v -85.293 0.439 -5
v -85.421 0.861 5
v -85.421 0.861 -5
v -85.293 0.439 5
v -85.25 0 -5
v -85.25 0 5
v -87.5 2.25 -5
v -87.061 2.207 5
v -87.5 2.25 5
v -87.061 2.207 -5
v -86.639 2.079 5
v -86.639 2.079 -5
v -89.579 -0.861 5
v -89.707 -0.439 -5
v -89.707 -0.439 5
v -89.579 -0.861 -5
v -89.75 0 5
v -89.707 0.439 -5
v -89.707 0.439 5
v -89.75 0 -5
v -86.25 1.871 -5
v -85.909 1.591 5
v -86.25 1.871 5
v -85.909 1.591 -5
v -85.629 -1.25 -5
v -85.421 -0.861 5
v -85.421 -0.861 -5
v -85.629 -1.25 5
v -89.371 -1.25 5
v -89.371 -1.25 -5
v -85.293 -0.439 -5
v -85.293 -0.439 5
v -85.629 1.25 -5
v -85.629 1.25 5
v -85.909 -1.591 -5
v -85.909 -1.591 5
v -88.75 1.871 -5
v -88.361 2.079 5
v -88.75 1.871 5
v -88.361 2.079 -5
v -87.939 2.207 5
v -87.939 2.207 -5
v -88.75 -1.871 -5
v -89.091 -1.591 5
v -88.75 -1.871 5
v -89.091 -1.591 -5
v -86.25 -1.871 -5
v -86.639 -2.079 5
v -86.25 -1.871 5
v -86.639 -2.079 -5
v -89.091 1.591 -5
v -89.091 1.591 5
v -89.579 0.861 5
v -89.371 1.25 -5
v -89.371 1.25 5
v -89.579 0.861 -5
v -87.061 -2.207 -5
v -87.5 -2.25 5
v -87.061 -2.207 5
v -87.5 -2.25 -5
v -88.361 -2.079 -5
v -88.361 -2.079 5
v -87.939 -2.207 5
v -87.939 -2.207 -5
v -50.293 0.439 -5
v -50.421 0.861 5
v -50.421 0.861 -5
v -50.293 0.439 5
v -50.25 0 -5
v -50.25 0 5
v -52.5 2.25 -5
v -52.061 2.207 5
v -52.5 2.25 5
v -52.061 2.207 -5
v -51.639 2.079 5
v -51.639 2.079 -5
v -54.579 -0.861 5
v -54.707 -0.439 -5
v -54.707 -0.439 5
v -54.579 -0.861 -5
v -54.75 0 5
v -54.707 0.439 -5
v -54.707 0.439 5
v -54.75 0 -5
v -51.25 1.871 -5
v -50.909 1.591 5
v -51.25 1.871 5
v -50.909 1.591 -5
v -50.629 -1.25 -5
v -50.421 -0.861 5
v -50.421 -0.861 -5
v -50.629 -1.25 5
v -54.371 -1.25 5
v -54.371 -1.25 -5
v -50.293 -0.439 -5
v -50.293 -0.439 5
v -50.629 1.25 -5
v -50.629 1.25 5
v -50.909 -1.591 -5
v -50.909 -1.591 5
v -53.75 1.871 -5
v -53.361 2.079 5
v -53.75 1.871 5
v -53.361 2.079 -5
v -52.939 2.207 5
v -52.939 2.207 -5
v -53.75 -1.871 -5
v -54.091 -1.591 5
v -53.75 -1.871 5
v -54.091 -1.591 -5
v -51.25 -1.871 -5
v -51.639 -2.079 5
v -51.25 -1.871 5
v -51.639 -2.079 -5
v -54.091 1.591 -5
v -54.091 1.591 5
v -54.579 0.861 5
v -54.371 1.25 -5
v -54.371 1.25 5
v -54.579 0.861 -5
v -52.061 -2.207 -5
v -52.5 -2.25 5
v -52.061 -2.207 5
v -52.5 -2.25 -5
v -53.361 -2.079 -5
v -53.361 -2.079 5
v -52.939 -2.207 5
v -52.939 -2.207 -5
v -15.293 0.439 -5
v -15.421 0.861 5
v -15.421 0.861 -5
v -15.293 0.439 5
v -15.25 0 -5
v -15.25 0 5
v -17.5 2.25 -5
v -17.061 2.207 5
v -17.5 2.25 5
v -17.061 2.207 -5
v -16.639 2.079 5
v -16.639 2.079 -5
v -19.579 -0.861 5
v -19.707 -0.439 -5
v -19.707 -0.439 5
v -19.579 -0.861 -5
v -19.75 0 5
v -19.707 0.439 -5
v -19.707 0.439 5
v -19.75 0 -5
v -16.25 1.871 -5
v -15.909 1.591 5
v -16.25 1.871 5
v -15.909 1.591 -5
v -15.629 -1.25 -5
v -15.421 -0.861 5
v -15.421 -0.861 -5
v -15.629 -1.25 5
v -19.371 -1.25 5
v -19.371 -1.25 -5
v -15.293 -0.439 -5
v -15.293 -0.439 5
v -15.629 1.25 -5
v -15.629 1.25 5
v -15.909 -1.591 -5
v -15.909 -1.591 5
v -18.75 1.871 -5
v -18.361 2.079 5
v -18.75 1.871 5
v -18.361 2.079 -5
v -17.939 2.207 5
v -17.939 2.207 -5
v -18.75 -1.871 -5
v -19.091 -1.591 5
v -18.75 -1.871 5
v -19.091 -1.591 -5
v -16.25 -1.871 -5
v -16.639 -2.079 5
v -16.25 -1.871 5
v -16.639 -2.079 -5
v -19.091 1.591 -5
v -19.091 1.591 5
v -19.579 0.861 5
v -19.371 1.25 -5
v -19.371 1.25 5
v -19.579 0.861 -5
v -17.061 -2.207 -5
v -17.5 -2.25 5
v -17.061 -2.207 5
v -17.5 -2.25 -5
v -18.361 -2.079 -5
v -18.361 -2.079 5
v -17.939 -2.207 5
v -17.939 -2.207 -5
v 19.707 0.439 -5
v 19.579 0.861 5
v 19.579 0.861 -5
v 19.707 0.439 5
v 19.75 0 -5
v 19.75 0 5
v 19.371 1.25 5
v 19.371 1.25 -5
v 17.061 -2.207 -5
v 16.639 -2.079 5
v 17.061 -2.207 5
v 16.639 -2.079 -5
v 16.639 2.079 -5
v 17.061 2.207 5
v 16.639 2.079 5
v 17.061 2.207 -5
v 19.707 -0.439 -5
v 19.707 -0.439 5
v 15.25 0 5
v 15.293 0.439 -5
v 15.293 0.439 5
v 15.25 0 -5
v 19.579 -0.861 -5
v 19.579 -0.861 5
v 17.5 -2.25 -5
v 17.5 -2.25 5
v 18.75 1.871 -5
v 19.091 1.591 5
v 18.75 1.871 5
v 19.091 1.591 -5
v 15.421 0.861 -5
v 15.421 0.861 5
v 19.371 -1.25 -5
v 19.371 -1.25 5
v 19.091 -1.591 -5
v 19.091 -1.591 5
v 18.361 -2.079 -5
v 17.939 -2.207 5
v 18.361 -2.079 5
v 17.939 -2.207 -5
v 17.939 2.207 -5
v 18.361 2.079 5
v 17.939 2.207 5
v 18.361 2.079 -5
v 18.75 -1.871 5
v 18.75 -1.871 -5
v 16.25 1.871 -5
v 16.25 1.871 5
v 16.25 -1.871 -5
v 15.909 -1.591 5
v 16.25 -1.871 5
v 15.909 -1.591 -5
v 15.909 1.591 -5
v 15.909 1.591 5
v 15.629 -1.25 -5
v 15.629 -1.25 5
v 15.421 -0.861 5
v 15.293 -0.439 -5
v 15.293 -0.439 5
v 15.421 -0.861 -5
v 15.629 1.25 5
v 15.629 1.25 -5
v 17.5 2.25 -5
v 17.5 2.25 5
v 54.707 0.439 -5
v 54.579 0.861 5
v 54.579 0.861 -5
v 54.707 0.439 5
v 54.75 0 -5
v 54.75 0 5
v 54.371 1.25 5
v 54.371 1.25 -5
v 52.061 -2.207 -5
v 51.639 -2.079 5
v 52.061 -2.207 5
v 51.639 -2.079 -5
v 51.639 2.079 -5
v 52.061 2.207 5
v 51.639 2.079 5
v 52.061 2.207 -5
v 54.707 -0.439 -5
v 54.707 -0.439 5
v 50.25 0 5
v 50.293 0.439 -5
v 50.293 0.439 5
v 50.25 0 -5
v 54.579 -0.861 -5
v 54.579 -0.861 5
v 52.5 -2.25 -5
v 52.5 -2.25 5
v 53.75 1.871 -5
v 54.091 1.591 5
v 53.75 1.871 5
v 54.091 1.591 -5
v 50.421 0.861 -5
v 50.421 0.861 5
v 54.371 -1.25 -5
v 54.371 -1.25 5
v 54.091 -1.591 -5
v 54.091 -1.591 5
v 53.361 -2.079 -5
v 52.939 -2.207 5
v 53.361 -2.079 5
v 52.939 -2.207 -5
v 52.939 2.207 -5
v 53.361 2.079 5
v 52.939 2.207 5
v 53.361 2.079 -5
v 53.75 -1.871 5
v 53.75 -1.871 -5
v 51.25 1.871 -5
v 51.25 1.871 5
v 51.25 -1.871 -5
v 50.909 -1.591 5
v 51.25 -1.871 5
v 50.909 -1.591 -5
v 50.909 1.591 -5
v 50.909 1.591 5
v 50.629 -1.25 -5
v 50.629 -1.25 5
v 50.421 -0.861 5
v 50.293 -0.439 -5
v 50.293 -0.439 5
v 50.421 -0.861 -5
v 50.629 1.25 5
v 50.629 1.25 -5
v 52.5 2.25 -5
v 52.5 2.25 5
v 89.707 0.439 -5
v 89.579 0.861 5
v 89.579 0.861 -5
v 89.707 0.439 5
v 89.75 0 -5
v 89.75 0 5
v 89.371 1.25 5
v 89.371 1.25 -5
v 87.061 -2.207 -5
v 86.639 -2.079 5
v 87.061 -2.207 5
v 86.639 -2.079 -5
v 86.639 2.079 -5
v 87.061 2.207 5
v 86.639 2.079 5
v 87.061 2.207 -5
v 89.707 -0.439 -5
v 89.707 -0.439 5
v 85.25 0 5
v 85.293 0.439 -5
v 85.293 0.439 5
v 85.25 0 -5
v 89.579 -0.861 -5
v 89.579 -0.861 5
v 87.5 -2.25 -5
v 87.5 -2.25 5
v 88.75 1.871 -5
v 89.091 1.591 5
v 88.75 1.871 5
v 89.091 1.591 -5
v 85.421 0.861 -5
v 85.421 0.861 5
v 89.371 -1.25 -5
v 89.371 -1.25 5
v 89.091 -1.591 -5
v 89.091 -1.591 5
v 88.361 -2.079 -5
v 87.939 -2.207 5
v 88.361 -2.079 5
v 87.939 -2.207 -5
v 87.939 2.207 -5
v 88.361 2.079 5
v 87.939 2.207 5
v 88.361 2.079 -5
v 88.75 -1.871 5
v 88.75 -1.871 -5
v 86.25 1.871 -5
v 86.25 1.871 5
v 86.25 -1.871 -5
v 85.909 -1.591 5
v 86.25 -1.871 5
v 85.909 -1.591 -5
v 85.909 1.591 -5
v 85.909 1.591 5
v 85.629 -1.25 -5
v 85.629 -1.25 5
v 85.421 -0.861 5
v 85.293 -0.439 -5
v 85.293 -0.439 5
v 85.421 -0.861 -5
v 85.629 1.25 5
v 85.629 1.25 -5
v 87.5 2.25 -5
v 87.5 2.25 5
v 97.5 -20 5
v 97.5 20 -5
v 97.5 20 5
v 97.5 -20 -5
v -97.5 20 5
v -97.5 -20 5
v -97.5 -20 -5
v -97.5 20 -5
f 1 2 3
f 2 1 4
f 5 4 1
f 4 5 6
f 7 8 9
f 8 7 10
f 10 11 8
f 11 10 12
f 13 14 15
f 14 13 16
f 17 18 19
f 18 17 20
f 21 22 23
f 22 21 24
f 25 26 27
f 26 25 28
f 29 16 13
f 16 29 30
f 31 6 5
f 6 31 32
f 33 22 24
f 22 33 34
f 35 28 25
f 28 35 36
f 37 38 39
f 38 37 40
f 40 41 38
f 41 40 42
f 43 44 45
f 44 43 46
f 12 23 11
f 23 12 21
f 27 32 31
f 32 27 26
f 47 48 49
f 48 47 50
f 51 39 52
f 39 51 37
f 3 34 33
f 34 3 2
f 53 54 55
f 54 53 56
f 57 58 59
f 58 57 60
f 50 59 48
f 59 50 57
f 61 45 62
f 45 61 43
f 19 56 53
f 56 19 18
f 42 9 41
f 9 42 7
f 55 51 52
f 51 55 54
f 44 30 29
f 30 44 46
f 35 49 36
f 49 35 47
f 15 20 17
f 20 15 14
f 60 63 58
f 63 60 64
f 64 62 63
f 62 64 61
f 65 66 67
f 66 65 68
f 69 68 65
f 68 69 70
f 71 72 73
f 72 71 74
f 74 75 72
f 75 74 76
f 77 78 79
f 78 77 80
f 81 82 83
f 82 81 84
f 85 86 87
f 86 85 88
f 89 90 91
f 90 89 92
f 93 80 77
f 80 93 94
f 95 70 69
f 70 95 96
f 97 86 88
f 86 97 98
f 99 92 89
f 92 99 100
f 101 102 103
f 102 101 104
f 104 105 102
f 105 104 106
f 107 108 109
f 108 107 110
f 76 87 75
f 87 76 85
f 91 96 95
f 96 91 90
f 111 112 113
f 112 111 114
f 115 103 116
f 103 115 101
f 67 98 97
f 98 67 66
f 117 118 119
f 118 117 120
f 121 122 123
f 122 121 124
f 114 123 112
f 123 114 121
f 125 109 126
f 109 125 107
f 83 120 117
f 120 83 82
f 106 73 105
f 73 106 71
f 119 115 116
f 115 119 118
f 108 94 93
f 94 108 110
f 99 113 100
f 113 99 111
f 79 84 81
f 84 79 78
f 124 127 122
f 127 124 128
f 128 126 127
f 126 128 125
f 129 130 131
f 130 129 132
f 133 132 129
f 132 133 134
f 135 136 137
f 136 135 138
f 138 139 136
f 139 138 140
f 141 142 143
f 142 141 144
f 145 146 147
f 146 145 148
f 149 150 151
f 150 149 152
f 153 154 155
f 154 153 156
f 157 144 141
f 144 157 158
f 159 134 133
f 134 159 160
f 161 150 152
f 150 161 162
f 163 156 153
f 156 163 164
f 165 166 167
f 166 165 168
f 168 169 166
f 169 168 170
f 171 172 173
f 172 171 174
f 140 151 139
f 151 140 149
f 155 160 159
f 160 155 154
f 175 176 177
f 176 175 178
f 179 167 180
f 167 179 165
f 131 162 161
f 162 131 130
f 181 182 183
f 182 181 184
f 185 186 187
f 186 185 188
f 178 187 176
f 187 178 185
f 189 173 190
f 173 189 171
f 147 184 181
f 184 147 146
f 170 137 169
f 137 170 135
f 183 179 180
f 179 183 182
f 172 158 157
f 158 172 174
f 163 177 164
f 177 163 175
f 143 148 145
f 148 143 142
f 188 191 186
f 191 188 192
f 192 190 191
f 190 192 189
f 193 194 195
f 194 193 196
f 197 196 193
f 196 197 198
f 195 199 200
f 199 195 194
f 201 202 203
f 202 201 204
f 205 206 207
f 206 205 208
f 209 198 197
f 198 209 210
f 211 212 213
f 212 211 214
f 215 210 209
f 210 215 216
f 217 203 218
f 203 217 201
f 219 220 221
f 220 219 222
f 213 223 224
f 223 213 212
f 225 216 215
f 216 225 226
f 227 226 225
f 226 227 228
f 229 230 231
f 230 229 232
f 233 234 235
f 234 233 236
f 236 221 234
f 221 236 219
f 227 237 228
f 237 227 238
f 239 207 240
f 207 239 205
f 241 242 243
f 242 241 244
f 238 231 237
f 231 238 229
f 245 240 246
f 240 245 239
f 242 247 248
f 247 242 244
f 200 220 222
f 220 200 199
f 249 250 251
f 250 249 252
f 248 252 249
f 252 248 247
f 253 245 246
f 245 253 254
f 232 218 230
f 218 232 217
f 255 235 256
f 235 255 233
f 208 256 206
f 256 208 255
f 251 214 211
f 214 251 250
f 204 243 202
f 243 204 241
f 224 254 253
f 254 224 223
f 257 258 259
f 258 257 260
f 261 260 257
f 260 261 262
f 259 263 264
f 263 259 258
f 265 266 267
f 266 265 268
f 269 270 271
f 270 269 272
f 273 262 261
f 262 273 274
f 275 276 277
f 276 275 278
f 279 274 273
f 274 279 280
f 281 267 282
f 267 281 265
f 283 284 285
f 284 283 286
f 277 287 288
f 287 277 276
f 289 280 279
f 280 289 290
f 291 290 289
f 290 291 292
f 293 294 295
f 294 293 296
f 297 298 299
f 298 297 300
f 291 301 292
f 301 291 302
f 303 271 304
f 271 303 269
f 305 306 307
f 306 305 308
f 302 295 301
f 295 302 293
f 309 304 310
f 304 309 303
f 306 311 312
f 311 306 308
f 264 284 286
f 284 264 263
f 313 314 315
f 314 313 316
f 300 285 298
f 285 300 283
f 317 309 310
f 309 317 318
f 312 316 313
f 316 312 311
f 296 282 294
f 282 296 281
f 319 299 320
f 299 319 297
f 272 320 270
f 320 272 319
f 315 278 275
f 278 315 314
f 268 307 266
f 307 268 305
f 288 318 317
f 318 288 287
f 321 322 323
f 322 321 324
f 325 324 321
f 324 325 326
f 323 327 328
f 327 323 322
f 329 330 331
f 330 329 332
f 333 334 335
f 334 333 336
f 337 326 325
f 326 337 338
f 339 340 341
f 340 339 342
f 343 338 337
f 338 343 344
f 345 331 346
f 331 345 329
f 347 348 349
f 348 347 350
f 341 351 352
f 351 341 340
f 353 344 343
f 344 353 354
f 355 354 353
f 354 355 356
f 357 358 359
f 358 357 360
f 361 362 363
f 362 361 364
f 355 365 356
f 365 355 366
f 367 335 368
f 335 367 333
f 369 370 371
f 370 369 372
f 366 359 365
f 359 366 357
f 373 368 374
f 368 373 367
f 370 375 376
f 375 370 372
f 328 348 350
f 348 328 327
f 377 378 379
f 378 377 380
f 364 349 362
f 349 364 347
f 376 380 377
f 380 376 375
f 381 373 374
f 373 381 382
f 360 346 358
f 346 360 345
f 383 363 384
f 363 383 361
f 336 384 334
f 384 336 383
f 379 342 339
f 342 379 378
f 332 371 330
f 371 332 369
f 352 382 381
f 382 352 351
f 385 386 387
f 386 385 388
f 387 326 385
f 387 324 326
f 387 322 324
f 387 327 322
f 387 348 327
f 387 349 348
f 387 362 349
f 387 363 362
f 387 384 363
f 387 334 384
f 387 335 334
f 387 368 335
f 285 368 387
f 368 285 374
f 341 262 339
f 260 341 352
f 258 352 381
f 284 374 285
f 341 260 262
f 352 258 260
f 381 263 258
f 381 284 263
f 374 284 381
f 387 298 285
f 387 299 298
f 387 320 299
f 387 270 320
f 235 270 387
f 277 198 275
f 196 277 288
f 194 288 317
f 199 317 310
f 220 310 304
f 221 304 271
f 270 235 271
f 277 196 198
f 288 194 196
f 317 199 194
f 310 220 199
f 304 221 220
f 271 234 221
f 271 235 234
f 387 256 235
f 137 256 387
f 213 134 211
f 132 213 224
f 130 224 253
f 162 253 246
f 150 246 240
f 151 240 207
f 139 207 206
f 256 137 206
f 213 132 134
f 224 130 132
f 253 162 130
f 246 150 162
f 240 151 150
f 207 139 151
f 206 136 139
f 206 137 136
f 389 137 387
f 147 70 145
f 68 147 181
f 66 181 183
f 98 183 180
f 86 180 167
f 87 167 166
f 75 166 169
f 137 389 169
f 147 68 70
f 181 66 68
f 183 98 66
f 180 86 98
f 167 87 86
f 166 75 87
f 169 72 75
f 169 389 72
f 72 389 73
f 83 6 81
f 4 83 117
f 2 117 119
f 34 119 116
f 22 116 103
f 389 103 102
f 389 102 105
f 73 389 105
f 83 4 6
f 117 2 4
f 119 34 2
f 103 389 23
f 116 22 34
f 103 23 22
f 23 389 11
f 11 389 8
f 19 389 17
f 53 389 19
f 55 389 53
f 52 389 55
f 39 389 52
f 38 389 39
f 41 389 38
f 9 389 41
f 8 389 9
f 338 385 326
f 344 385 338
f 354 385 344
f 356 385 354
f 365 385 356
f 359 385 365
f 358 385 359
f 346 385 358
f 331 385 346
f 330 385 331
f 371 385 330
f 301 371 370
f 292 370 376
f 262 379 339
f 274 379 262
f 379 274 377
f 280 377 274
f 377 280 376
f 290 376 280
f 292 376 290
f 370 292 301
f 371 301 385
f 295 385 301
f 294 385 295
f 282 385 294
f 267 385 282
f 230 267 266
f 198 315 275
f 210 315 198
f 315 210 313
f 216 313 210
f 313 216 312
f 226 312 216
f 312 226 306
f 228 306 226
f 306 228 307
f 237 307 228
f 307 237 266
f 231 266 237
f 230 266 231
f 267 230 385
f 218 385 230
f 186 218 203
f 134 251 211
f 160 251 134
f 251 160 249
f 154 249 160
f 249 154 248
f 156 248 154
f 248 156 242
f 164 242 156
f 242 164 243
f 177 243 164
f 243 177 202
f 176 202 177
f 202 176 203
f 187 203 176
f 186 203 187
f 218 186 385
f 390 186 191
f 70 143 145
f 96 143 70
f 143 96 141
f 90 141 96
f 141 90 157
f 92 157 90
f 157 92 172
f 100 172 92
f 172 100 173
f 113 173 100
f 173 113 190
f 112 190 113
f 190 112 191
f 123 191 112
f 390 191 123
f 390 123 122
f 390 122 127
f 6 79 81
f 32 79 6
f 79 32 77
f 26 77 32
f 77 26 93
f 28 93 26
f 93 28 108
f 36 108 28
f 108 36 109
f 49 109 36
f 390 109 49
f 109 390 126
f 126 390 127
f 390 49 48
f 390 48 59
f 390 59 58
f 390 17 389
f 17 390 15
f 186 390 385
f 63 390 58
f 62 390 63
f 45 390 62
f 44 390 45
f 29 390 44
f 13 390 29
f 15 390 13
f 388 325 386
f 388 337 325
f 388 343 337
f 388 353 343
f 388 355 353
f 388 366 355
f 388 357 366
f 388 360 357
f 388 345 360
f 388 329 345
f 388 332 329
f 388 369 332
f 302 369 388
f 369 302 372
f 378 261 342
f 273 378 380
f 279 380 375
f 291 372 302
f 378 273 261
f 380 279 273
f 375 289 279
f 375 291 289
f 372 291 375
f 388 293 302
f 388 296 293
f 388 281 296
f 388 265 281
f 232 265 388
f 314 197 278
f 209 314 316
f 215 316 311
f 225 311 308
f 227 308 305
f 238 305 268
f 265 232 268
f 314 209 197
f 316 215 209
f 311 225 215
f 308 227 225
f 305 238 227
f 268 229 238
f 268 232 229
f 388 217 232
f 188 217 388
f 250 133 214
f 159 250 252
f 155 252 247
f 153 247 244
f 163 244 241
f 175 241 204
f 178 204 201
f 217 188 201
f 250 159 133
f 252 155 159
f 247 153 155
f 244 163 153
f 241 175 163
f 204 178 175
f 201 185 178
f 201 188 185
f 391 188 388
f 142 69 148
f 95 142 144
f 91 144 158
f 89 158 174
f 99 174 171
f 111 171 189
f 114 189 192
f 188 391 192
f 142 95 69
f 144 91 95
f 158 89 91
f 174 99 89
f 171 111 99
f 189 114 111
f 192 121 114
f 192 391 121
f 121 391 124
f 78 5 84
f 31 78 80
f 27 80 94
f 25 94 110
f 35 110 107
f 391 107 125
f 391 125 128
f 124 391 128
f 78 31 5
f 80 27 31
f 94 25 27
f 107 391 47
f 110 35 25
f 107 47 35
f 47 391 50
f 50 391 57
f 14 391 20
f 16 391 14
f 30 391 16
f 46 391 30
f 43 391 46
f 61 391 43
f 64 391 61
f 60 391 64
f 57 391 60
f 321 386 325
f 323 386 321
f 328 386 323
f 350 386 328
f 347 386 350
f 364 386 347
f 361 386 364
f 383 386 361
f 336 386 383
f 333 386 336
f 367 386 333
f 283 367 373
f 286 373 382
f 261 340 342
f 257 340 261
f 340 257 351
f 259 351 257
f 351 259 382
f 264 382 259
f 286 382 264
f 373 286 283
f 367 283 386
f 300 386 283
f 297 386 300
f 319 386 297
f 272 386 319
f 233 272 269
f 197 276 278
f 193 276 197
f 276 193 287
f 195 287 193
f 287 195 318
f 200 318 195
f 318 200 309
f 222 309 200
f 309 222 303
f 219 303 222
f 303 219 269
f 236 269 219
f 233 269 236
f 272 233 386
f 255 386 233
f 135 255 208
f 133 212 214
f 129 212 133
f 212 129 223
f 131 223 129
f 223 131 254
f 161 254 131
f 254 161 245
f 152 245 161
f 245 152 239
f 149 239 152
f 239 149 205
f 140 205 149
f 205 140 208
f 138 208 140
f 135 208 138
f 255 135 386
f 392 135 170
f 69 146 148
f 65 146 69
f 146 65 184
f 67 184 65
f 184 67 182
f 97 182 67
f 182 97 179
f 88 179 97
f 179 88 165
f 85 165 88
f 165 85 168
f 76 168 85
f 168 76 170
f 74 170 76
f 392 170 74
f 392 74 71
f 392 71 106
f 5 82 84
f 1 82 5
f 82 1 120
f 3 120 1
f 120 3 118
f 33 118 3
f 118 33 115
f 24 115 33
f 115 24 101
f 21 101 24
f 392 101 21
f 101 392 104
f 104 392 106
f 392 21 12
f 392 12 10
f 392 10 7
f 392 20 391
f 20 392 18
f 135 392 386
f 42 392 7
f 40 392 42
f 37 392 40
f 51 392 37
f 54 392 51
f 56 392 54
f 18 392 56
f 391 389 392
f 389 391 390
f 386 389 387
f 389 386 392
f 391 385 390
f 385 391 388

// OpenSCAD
$fn = 32;

// ----------------------------------------------------------------------
// Hole bar, 6 x Ø4.5
// row layout, 10 mm edge offset
// ----------------------------------------------------------------------

// --- parameters (mm) ---
bar_w = 40;    // bar width (Y)
bar_t = 10;    // bar thickness (Z)
holes = 6;     // holes per row
hole_d = 4.5;  // hole diameter
edge = 10;     // offset from the bar end to the first hole
pitch = 35;    // pitch between neighbouring holes

// --- derived feature positions (mm) ---
span = (holes - 1) * pitch;   // = 175   distance between the end holes
bar_l = span + 2 * edge;      // = 195   overall bar length
start_x = -bar_l / 2 + edge;  // = -87.5   X of the first hole
feature_centers = [
  [start_x + 0 * pitch, 0],
  [start_x + 1 * pitch, 0],
  [start_x + 2 * pitch, 0],
  [start_x + 3 * pitch, 0],
  [start_x + 4 * pitch, 0],
  [start_x + 5 * pitch, 0]
];   // hole centres of the first row

// bar with one row of holes, drilled from feature_centers
difference() {
  translate([-bar_l / 2, -bar_w / 2, -bar_t / 2]) cube([bar_l, bar_w, bar_t]);
  for (centre = feature_centers)
    translate([centre[0], centre[1], 0])
      cylinder(d = hole_d, h = bar_t + 2, center = true);
}
